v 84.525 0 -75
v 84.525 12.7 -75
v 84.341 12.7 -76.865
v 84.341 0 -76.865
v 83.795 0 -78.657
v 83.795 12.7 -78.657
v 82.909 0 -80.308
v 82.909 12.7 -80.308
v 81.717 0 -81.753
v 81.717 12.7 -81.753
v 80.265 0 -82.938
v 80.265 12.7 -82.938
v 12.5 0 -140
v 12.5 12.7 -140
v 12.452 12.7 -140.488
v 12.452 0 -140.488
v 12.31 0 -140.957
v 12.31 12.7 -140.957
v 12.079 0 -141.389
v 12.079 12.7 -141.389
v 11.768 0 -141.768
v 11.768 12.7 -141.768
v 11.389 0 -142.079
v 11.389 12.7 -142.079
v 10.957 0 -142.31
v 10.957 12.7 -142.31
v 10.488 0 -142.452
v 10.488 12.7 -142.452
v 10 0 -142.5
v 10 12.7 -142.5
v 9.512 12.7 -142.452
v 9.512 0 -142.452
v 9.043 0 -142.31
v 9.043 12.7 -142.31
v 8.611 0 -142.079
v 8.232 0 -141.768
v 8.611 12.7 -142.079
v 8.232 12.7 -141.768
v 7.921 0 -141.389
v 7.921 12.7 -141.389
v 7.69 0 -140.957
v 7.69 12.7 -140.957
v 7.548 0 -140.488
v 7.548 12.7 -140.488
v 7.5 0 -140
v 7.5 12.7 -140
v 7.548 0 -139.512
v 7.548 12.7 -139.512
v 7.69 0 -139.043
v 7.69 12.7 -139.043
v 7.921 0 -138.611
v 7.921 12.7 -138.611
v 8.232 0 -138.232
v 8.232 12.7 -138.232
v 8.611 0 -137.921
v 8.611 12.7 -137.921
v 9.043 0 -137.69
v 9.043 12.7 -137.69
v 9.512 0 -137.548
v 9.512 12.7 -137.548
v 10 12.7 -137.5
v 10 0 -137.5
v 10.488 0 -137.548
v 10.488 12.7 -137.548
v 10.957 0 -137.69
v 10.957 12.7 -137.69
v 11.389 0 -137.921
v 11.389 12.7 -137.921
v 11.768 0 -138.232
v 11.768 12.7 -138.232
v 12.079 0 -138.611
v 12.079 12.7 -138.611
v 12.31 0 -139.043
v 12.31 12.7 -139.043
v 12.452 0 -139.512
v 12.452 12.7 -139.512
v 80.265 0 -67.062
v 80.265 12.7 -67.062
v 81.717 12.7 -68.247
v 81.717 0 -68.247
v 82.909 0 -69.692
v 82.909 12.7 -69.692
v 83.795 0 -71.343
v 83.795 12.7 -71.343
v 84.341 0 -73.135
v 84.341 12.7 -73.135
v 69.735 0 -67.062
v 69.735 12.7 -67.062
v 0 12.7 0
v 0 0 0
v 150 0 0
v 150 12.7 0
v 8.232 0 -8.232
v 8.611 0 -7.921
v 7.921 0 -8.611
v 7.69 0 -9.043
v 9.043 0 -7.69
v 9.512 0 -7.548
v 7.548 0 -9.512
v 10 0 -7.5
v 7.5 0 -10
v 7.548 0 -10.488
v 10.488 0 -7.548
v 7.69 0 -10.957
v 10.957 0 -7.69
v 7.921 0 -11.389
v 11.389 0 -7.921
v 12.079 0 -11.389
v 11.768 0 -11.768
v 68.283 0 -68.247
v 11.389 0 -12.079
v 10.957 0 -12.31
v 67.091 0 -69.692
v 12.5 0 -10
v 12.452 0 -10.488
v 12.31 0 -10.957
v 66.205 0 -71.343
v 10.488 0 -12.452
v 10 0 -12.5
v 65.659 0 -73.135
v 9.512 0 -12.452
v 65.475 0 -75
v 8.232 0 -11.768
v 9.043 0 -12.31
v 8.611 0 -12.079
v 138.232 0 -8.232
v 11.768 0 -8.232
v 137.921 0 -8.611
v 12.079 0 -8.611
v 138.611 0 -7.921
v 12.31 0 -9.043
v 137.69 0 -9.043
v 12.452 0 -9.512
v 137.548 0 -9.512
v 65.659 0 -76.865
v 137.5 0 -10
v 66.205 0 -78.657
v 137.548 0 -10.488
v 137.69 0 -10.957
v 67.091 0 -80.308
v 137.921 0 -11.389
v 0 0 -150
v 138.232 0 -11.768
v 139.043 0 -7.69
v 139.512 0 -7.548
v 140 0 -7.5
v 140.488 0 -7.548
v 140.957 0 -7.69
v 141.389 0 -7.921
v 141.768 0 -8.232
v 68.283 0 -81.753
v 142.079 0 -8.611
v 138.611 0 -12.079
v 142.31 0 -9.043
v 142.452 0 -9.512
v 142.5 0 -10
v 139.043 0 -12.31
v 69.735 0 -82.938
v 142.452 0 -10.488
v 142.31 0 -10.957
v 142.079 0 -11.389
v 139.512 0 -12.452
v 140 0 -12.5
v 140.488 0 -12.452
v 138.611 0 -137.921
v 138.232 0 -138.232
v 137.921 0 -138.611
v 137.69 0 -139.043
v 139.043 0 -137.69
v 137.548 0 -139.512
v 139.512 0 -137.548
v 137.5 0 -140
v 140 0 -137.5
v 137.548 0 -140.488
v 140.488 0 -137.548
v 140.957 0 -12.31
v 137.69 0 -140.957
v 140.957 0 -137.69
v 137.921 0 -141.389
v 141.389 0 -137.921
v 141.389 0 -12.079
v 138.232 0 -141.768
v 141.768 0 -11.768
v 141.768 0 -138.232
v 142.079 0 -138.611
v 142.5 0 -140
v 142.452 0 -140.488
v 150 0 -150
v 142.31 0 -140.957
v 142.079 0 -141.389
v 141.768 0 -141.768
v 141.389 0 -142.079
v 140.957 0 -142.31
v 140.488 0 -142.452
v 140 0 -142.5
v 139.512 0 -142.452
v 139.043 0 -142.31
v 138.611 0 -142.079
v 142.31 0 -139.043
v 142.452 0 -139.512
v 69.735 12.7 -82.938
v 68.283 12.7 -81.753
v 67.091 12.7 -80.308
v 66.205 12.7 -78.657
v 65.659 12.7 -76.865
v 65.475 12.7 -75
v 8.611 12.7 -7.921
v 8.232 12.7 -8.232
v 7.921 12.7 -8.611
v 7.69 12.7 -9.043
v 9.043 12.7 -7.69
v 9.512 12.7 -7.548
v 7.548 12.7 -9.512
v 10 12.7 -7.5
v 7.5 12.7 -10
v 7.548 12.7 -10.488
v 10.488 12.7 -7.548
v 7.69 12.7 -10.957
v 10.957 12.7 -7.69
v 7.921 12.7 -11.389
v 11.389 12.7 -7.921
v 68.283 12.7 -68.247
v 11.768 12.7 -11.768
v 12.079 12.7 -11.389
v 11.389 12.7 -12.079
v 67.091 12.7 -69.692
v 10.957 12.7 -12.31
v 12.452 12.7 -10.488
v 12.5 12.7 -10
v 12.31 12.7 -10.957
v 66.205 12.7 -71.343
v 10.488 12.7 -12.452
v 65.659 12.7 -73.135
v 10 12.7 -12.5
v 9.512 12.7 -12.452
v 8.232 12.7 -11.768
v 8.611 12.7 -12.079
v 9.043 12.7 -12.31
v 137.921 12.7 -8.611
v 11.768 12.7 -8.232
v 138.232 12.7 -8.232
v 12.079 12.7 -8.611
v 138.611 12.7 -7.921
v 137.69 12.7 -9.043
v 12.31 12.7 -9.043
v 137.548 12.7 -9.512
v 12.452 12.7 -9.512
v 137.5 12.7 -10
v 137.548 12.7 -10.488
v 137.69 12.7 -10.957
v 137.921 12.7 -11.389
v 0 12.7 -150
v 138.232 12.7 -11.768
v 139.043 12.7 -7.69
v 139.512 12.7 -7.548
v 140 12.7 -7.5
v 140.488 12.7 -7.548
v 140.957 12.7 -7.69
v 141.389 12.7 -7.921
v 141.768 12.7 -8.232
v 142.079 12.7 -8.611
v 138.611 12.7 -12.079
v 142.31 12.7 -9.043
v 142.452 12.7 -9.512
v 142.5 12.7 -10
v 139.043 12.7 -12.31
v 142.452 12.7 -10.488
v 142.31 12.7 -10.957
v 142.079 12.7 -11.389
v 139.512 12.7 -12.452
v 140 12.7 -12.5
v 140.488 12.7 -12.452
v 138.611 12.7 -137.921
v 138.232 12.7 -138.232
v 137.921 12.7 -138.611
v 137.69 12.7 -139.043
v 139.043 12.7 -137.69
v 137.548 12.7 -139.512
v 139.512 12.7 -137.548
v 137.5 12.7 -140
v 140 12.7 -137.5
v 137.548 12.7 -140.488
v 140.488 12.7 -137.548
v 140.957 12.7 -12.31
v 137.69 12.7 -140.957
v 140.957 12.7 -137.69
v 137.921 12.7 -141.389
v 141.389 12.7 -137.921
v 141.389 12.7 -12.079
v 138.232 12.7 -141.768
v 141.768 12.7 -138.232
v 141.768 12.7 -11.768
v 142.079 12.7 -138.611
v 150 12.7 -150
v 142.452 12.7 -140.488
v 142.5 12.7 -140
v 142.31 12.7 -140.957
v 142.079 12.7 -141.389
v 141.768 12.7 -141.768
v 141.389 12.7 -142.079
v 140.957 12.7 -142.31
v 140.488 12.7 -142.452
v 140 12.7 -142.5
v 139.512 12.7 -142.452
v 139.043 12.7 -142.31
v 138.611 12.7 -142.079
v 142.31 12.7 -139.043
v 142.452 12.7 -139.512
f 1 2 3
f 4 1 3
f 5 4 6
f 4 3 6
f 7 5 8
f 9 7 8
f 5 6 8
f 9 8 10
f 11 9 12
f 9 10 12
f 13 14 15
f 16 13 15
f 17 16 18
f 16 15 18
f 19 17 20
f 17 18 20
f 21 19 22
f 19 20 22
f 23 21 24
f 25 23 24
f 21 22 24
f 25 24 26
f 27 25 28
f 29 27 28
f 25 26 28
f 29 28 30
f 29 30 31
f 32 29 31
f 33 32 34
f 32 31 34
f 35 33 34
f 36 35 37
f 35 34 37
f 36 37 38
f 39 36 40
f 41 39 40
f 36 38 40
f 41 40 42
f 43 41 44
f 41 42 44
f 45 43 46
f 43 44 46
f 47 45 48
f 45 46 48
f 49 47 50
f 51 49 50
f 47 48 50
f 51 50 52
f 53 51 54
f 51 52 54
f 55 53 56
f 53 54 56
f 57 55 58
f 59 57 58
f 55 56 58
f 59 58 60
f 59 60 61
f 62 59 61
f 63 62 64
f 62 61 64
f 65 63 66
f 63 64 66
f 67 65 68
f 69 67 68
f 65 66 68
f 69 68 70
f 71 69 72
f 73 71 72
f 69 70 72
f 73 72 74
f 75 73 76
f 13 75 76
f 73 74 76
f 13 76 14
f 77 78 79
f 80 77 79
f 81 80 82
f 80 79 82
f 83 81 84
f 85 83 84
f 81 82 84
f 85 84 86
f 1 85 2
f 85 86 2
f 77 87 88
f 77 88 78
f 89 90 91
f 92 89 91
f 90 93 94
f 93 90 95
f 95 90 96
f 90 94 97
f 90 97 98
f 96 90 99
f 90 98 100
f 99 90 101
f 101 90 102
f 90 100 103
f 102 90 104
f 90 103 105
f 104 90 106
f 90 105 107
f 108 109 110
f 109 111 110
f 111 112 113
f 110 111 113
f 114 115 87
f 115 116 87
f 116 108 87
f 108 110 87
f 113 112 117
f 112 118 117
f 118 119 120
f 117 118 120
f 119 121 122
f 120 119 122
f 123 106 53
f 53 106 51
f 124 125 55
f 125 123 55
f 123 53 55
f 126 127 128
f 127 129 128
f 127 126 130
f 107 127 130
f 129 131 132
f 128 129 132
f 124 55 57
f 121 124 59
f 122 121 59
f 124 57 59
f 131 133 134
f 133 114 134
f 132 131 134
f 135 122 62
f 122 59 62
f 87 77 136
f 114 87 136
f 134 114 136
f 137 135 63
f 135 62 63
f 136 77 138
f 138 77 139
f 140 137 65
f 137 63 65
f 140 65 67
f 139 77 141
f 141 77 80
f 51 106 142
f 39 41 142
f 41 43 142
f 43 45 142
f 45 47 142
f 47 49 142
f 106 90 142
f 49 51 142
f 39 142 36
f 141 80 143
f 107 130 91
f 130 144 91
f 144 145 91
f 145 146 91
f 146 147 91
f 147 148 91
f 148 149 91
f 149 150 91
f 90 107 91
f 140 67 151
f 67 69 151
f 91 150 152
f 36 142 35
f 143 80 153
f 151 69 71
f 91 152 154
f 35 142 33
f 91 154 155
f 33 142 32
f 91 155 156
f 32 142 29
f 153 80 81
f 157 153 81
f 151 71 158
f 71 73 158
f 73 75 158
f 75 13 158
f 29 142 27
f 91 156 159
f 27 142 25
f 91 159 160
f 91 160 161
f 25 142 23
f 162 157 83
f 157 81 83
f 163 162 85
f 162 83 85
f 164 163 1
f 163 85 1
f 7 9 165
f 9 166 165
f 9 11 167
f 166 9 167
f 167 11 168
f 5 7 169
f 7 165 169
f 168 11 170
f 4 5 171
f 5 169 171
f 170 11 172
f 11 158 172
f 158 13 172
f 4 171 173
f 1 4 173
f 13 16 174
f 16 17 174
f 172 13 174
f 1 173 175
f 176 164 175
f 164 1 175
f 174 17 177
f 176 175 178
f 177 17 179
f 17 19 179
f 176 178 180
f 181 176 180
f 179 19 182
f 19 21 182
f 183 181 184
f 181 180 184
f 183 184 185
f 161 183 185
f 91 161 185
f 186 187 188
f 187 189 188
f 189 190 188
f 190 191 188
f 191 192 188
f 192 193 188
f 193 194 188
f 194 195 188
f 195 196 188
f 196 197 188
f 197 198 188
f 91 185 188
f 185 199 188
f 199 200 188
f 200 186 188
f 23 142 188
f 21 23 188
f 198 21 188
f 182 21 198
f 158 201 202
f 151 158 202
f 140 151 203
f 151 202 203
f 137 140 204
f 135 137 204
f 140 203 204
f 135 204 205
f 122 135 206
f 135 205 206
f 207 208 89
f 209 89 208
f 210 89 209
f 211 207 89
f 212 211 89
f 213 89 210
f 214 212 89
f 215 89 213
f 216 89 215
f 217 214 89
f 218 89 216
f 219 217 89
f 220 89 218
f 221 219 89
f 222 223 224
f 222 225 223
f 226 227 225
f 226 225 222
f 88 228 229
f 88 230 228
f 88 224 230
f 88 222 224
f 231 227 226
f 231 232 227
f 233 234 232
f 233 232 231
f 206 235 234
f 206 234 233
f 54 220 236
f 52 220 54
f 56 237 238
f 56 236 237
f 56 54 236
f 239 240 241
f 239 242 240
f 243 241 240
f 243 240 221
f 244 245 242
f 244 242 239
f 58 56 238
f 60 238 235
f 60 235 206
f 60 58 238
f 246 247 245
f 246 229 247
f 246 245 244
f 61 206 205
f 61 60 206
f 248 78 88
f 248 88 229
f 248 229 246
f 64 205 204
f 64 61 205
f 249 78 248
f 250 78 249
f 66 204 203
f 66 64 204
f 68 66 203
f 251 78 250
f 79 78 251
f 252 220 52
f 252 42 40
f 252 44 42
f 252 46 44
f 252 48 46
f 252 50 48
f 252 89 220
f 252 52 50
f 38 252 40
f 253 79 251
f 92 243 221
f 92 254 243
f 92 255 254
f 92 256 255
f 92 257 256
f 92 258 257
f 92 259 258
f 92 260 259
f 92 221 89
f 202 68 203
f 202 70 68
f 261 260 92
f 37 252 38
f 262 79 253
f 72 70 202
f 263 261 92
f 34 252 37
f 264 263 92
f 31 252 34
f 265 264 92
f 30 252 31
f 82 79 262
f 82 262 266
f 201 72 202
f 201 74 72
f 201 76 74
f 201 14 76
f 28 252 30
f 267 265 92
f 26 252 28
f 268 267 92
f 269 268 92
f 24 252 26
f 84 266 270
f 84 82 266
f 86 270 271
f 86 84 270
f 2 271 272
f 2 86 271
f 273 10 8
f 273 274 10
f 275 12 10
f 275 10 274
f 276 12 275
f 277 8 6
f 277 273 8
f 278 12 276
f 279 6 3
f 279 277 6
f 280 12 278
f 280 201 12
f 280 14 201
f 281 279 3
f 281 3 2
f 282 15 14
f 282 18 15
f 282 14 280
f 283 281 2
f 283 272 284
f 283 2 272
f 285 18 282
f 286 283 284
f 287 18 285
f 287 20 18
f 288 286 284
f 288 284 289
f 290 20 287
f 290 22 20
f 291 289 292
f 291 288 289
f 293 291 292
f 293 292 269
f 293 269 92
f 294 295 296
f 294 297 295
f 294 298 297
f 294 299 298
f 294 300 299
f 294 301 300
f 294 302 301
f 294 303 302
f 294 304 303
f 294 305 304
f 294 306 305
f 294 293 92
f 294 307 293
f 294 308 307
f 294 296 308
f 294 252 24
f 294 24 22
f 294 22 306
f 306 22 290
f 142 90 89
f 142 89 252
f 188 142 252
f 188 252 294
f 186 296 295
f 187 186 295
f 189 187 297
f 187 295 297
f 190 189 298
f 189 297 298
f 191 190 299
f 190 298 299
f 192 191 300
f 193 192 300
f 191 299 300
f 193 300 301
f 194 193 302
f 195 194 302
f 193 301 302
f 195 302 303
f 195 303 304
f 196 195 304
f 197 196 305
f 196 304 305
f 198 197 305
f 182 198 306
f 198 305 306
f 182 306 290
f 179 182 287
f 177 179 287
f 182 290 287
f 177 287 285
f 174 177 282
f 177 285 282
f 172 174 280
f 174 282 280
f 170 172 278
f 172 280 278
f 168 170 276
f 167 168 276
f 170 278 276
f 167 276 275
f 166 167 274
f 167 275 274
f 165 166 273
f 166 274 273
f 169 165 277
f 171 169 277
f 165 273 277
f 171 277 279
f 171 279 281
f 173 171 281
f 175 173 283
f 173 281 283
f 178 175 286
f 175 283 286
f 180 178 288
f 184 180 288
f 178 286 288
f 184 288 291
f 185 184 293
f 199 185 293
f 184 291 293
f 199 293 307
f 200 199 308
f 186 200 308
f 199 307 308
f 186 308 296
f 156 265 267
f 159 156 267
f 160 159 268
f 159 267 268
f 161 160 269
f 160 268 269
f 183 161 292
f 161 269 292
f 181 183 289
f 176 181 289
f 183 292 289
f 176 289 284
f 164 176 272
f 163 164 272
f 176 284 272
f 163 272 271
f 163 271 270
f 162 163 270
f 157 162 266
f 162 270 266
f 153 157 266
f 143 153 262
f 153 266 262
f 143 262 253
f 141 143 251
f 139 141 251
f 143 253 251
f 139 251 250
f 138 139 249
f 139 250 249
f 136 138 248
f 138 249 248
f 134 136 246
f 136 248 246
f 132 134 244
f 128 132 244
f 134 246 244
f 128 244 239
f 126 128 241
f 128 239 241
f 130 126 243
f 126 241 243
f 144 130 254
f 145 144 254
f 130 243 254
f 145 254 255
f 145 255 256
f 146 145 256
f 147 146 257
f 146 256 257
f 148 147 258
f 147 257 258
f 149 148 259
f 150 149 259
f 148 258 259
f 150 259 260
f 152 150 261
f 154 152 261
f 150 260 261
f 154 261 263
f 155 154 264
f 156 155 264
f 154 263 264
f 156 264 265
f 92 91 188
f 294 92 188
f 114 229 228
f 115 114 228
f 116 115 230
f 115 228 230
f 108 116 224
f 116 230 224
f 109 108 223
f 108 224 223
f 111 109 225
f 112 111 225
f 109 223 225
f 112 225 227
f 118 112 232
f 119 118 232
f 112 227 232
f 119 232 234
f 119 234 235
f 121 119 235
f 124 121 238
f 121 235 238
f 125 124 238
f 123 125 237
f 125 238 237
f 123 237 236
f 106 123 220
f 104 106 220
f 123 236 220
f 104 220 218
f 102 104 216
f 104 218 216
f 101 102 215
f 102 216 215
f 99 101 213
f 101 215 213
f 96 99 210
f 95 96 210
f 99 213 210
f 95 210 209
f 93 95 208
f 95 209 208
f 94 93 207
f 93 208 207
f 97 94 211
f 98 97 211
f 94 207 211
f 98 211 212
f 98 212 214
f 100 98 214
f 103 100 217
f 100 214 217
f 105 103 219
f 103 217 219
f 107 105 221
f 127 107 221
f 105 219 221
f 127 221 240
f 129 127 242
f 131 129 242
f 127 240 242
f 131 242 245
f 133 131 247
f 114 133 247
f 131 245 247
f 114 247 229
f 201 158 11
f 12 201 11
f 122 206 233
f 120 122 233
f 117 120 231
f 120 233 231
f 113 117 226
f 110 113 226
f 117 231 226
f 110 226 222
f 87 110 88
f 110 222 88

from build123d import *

# Parameters (mm, degrees)
SKETCH1_W           = 150
SKETCH1_H           = 150
BOSS_EXTRUDE1_DEPTH = 12.7
SKETCH2_W           = 10.53028371
SKETCH2_H           = 7.9375
SKETCH2_R           = 2.5
CUT_EXTRUDE1_DEPTH  = 12.7


with BuildPart() as part:
    # Sketch1 → Boss-Extrude1 (new body)
    with BuildSketch(Plane(origin=(0, 0, 0), x_dir=(1, 0, 0), z_dir=(0, 1, 0))):
        with Locations((75, 75)):
            Rectangle(SKETCH1_W, SKETCH1_H)
    extrude(amount=BOSS_EXTRUDE1_DEPTH)

    # Sketch2 → Cut-Extrude1 (cut)
    with BuildSketch(Plane(origin=(0, 12.7, 0), x_dir=(1, 0, 0), z_dir=(0, 1, 0))):
        with BuildLine():
            ThreePointArc((80.265141855, 67.0625), (83.392737967, 70.495827), (84.525, 75))
            Line((84.525, 75), (80.265141855, 75))
            Line((80.265141855, 75), (80.265141855, 67.0625))
        make_face()
        with BuildLine():
            Line((80.265141855, 75), (84.525, 75))
            ThreePointArc((84.525, 75), (83.392737967, 79.504173), (80.265141855, 82.9375))
            Line((80.265141855, 82.9375), (80.265141855, 75))
        make_face()
        with BuildLine():
            Line((69.734858145, 67.0625), (69.734858145, 75))
            Line((69.734858145, 75), (65.475, 75))
            ThreePointArc((65.475, 75), (66.607262033, 70.495827), (69.734858145, 67.0625))
        make_face()
        with BuildLine():
            Line((65.475, 75), (69.734858145, 75))
            Line((69.734858145, 75), (69.734858145, 82.9375))
            ThreePointArc((69.734858145, 82.9375), (66.607262033, 79.504173), (65.475, 75))
        make_face()
        with Locations((75, 78.96875)):
            Rectangle(SKETCH2_W, SKETCH2_H)
        with Locations((75, 71.03125)):
            Rectangle(SKETCH2_W, SKETCH2_H)
        with Locations((10, 140)):
            Circle(SKETCH2_R)
        with Locations((140, 140)):
            Circle(SKETCH2_R)
        with Locations((140, 10)):
            Circle(SKETCH2_R)
        with Locations((10, 10)):
            Circle(SKETCH2_R)
    extrude(amount=-CUT_EXTRUDE1_DEPTH, mode=Mode.SUBTRACT)


solid = part.part
